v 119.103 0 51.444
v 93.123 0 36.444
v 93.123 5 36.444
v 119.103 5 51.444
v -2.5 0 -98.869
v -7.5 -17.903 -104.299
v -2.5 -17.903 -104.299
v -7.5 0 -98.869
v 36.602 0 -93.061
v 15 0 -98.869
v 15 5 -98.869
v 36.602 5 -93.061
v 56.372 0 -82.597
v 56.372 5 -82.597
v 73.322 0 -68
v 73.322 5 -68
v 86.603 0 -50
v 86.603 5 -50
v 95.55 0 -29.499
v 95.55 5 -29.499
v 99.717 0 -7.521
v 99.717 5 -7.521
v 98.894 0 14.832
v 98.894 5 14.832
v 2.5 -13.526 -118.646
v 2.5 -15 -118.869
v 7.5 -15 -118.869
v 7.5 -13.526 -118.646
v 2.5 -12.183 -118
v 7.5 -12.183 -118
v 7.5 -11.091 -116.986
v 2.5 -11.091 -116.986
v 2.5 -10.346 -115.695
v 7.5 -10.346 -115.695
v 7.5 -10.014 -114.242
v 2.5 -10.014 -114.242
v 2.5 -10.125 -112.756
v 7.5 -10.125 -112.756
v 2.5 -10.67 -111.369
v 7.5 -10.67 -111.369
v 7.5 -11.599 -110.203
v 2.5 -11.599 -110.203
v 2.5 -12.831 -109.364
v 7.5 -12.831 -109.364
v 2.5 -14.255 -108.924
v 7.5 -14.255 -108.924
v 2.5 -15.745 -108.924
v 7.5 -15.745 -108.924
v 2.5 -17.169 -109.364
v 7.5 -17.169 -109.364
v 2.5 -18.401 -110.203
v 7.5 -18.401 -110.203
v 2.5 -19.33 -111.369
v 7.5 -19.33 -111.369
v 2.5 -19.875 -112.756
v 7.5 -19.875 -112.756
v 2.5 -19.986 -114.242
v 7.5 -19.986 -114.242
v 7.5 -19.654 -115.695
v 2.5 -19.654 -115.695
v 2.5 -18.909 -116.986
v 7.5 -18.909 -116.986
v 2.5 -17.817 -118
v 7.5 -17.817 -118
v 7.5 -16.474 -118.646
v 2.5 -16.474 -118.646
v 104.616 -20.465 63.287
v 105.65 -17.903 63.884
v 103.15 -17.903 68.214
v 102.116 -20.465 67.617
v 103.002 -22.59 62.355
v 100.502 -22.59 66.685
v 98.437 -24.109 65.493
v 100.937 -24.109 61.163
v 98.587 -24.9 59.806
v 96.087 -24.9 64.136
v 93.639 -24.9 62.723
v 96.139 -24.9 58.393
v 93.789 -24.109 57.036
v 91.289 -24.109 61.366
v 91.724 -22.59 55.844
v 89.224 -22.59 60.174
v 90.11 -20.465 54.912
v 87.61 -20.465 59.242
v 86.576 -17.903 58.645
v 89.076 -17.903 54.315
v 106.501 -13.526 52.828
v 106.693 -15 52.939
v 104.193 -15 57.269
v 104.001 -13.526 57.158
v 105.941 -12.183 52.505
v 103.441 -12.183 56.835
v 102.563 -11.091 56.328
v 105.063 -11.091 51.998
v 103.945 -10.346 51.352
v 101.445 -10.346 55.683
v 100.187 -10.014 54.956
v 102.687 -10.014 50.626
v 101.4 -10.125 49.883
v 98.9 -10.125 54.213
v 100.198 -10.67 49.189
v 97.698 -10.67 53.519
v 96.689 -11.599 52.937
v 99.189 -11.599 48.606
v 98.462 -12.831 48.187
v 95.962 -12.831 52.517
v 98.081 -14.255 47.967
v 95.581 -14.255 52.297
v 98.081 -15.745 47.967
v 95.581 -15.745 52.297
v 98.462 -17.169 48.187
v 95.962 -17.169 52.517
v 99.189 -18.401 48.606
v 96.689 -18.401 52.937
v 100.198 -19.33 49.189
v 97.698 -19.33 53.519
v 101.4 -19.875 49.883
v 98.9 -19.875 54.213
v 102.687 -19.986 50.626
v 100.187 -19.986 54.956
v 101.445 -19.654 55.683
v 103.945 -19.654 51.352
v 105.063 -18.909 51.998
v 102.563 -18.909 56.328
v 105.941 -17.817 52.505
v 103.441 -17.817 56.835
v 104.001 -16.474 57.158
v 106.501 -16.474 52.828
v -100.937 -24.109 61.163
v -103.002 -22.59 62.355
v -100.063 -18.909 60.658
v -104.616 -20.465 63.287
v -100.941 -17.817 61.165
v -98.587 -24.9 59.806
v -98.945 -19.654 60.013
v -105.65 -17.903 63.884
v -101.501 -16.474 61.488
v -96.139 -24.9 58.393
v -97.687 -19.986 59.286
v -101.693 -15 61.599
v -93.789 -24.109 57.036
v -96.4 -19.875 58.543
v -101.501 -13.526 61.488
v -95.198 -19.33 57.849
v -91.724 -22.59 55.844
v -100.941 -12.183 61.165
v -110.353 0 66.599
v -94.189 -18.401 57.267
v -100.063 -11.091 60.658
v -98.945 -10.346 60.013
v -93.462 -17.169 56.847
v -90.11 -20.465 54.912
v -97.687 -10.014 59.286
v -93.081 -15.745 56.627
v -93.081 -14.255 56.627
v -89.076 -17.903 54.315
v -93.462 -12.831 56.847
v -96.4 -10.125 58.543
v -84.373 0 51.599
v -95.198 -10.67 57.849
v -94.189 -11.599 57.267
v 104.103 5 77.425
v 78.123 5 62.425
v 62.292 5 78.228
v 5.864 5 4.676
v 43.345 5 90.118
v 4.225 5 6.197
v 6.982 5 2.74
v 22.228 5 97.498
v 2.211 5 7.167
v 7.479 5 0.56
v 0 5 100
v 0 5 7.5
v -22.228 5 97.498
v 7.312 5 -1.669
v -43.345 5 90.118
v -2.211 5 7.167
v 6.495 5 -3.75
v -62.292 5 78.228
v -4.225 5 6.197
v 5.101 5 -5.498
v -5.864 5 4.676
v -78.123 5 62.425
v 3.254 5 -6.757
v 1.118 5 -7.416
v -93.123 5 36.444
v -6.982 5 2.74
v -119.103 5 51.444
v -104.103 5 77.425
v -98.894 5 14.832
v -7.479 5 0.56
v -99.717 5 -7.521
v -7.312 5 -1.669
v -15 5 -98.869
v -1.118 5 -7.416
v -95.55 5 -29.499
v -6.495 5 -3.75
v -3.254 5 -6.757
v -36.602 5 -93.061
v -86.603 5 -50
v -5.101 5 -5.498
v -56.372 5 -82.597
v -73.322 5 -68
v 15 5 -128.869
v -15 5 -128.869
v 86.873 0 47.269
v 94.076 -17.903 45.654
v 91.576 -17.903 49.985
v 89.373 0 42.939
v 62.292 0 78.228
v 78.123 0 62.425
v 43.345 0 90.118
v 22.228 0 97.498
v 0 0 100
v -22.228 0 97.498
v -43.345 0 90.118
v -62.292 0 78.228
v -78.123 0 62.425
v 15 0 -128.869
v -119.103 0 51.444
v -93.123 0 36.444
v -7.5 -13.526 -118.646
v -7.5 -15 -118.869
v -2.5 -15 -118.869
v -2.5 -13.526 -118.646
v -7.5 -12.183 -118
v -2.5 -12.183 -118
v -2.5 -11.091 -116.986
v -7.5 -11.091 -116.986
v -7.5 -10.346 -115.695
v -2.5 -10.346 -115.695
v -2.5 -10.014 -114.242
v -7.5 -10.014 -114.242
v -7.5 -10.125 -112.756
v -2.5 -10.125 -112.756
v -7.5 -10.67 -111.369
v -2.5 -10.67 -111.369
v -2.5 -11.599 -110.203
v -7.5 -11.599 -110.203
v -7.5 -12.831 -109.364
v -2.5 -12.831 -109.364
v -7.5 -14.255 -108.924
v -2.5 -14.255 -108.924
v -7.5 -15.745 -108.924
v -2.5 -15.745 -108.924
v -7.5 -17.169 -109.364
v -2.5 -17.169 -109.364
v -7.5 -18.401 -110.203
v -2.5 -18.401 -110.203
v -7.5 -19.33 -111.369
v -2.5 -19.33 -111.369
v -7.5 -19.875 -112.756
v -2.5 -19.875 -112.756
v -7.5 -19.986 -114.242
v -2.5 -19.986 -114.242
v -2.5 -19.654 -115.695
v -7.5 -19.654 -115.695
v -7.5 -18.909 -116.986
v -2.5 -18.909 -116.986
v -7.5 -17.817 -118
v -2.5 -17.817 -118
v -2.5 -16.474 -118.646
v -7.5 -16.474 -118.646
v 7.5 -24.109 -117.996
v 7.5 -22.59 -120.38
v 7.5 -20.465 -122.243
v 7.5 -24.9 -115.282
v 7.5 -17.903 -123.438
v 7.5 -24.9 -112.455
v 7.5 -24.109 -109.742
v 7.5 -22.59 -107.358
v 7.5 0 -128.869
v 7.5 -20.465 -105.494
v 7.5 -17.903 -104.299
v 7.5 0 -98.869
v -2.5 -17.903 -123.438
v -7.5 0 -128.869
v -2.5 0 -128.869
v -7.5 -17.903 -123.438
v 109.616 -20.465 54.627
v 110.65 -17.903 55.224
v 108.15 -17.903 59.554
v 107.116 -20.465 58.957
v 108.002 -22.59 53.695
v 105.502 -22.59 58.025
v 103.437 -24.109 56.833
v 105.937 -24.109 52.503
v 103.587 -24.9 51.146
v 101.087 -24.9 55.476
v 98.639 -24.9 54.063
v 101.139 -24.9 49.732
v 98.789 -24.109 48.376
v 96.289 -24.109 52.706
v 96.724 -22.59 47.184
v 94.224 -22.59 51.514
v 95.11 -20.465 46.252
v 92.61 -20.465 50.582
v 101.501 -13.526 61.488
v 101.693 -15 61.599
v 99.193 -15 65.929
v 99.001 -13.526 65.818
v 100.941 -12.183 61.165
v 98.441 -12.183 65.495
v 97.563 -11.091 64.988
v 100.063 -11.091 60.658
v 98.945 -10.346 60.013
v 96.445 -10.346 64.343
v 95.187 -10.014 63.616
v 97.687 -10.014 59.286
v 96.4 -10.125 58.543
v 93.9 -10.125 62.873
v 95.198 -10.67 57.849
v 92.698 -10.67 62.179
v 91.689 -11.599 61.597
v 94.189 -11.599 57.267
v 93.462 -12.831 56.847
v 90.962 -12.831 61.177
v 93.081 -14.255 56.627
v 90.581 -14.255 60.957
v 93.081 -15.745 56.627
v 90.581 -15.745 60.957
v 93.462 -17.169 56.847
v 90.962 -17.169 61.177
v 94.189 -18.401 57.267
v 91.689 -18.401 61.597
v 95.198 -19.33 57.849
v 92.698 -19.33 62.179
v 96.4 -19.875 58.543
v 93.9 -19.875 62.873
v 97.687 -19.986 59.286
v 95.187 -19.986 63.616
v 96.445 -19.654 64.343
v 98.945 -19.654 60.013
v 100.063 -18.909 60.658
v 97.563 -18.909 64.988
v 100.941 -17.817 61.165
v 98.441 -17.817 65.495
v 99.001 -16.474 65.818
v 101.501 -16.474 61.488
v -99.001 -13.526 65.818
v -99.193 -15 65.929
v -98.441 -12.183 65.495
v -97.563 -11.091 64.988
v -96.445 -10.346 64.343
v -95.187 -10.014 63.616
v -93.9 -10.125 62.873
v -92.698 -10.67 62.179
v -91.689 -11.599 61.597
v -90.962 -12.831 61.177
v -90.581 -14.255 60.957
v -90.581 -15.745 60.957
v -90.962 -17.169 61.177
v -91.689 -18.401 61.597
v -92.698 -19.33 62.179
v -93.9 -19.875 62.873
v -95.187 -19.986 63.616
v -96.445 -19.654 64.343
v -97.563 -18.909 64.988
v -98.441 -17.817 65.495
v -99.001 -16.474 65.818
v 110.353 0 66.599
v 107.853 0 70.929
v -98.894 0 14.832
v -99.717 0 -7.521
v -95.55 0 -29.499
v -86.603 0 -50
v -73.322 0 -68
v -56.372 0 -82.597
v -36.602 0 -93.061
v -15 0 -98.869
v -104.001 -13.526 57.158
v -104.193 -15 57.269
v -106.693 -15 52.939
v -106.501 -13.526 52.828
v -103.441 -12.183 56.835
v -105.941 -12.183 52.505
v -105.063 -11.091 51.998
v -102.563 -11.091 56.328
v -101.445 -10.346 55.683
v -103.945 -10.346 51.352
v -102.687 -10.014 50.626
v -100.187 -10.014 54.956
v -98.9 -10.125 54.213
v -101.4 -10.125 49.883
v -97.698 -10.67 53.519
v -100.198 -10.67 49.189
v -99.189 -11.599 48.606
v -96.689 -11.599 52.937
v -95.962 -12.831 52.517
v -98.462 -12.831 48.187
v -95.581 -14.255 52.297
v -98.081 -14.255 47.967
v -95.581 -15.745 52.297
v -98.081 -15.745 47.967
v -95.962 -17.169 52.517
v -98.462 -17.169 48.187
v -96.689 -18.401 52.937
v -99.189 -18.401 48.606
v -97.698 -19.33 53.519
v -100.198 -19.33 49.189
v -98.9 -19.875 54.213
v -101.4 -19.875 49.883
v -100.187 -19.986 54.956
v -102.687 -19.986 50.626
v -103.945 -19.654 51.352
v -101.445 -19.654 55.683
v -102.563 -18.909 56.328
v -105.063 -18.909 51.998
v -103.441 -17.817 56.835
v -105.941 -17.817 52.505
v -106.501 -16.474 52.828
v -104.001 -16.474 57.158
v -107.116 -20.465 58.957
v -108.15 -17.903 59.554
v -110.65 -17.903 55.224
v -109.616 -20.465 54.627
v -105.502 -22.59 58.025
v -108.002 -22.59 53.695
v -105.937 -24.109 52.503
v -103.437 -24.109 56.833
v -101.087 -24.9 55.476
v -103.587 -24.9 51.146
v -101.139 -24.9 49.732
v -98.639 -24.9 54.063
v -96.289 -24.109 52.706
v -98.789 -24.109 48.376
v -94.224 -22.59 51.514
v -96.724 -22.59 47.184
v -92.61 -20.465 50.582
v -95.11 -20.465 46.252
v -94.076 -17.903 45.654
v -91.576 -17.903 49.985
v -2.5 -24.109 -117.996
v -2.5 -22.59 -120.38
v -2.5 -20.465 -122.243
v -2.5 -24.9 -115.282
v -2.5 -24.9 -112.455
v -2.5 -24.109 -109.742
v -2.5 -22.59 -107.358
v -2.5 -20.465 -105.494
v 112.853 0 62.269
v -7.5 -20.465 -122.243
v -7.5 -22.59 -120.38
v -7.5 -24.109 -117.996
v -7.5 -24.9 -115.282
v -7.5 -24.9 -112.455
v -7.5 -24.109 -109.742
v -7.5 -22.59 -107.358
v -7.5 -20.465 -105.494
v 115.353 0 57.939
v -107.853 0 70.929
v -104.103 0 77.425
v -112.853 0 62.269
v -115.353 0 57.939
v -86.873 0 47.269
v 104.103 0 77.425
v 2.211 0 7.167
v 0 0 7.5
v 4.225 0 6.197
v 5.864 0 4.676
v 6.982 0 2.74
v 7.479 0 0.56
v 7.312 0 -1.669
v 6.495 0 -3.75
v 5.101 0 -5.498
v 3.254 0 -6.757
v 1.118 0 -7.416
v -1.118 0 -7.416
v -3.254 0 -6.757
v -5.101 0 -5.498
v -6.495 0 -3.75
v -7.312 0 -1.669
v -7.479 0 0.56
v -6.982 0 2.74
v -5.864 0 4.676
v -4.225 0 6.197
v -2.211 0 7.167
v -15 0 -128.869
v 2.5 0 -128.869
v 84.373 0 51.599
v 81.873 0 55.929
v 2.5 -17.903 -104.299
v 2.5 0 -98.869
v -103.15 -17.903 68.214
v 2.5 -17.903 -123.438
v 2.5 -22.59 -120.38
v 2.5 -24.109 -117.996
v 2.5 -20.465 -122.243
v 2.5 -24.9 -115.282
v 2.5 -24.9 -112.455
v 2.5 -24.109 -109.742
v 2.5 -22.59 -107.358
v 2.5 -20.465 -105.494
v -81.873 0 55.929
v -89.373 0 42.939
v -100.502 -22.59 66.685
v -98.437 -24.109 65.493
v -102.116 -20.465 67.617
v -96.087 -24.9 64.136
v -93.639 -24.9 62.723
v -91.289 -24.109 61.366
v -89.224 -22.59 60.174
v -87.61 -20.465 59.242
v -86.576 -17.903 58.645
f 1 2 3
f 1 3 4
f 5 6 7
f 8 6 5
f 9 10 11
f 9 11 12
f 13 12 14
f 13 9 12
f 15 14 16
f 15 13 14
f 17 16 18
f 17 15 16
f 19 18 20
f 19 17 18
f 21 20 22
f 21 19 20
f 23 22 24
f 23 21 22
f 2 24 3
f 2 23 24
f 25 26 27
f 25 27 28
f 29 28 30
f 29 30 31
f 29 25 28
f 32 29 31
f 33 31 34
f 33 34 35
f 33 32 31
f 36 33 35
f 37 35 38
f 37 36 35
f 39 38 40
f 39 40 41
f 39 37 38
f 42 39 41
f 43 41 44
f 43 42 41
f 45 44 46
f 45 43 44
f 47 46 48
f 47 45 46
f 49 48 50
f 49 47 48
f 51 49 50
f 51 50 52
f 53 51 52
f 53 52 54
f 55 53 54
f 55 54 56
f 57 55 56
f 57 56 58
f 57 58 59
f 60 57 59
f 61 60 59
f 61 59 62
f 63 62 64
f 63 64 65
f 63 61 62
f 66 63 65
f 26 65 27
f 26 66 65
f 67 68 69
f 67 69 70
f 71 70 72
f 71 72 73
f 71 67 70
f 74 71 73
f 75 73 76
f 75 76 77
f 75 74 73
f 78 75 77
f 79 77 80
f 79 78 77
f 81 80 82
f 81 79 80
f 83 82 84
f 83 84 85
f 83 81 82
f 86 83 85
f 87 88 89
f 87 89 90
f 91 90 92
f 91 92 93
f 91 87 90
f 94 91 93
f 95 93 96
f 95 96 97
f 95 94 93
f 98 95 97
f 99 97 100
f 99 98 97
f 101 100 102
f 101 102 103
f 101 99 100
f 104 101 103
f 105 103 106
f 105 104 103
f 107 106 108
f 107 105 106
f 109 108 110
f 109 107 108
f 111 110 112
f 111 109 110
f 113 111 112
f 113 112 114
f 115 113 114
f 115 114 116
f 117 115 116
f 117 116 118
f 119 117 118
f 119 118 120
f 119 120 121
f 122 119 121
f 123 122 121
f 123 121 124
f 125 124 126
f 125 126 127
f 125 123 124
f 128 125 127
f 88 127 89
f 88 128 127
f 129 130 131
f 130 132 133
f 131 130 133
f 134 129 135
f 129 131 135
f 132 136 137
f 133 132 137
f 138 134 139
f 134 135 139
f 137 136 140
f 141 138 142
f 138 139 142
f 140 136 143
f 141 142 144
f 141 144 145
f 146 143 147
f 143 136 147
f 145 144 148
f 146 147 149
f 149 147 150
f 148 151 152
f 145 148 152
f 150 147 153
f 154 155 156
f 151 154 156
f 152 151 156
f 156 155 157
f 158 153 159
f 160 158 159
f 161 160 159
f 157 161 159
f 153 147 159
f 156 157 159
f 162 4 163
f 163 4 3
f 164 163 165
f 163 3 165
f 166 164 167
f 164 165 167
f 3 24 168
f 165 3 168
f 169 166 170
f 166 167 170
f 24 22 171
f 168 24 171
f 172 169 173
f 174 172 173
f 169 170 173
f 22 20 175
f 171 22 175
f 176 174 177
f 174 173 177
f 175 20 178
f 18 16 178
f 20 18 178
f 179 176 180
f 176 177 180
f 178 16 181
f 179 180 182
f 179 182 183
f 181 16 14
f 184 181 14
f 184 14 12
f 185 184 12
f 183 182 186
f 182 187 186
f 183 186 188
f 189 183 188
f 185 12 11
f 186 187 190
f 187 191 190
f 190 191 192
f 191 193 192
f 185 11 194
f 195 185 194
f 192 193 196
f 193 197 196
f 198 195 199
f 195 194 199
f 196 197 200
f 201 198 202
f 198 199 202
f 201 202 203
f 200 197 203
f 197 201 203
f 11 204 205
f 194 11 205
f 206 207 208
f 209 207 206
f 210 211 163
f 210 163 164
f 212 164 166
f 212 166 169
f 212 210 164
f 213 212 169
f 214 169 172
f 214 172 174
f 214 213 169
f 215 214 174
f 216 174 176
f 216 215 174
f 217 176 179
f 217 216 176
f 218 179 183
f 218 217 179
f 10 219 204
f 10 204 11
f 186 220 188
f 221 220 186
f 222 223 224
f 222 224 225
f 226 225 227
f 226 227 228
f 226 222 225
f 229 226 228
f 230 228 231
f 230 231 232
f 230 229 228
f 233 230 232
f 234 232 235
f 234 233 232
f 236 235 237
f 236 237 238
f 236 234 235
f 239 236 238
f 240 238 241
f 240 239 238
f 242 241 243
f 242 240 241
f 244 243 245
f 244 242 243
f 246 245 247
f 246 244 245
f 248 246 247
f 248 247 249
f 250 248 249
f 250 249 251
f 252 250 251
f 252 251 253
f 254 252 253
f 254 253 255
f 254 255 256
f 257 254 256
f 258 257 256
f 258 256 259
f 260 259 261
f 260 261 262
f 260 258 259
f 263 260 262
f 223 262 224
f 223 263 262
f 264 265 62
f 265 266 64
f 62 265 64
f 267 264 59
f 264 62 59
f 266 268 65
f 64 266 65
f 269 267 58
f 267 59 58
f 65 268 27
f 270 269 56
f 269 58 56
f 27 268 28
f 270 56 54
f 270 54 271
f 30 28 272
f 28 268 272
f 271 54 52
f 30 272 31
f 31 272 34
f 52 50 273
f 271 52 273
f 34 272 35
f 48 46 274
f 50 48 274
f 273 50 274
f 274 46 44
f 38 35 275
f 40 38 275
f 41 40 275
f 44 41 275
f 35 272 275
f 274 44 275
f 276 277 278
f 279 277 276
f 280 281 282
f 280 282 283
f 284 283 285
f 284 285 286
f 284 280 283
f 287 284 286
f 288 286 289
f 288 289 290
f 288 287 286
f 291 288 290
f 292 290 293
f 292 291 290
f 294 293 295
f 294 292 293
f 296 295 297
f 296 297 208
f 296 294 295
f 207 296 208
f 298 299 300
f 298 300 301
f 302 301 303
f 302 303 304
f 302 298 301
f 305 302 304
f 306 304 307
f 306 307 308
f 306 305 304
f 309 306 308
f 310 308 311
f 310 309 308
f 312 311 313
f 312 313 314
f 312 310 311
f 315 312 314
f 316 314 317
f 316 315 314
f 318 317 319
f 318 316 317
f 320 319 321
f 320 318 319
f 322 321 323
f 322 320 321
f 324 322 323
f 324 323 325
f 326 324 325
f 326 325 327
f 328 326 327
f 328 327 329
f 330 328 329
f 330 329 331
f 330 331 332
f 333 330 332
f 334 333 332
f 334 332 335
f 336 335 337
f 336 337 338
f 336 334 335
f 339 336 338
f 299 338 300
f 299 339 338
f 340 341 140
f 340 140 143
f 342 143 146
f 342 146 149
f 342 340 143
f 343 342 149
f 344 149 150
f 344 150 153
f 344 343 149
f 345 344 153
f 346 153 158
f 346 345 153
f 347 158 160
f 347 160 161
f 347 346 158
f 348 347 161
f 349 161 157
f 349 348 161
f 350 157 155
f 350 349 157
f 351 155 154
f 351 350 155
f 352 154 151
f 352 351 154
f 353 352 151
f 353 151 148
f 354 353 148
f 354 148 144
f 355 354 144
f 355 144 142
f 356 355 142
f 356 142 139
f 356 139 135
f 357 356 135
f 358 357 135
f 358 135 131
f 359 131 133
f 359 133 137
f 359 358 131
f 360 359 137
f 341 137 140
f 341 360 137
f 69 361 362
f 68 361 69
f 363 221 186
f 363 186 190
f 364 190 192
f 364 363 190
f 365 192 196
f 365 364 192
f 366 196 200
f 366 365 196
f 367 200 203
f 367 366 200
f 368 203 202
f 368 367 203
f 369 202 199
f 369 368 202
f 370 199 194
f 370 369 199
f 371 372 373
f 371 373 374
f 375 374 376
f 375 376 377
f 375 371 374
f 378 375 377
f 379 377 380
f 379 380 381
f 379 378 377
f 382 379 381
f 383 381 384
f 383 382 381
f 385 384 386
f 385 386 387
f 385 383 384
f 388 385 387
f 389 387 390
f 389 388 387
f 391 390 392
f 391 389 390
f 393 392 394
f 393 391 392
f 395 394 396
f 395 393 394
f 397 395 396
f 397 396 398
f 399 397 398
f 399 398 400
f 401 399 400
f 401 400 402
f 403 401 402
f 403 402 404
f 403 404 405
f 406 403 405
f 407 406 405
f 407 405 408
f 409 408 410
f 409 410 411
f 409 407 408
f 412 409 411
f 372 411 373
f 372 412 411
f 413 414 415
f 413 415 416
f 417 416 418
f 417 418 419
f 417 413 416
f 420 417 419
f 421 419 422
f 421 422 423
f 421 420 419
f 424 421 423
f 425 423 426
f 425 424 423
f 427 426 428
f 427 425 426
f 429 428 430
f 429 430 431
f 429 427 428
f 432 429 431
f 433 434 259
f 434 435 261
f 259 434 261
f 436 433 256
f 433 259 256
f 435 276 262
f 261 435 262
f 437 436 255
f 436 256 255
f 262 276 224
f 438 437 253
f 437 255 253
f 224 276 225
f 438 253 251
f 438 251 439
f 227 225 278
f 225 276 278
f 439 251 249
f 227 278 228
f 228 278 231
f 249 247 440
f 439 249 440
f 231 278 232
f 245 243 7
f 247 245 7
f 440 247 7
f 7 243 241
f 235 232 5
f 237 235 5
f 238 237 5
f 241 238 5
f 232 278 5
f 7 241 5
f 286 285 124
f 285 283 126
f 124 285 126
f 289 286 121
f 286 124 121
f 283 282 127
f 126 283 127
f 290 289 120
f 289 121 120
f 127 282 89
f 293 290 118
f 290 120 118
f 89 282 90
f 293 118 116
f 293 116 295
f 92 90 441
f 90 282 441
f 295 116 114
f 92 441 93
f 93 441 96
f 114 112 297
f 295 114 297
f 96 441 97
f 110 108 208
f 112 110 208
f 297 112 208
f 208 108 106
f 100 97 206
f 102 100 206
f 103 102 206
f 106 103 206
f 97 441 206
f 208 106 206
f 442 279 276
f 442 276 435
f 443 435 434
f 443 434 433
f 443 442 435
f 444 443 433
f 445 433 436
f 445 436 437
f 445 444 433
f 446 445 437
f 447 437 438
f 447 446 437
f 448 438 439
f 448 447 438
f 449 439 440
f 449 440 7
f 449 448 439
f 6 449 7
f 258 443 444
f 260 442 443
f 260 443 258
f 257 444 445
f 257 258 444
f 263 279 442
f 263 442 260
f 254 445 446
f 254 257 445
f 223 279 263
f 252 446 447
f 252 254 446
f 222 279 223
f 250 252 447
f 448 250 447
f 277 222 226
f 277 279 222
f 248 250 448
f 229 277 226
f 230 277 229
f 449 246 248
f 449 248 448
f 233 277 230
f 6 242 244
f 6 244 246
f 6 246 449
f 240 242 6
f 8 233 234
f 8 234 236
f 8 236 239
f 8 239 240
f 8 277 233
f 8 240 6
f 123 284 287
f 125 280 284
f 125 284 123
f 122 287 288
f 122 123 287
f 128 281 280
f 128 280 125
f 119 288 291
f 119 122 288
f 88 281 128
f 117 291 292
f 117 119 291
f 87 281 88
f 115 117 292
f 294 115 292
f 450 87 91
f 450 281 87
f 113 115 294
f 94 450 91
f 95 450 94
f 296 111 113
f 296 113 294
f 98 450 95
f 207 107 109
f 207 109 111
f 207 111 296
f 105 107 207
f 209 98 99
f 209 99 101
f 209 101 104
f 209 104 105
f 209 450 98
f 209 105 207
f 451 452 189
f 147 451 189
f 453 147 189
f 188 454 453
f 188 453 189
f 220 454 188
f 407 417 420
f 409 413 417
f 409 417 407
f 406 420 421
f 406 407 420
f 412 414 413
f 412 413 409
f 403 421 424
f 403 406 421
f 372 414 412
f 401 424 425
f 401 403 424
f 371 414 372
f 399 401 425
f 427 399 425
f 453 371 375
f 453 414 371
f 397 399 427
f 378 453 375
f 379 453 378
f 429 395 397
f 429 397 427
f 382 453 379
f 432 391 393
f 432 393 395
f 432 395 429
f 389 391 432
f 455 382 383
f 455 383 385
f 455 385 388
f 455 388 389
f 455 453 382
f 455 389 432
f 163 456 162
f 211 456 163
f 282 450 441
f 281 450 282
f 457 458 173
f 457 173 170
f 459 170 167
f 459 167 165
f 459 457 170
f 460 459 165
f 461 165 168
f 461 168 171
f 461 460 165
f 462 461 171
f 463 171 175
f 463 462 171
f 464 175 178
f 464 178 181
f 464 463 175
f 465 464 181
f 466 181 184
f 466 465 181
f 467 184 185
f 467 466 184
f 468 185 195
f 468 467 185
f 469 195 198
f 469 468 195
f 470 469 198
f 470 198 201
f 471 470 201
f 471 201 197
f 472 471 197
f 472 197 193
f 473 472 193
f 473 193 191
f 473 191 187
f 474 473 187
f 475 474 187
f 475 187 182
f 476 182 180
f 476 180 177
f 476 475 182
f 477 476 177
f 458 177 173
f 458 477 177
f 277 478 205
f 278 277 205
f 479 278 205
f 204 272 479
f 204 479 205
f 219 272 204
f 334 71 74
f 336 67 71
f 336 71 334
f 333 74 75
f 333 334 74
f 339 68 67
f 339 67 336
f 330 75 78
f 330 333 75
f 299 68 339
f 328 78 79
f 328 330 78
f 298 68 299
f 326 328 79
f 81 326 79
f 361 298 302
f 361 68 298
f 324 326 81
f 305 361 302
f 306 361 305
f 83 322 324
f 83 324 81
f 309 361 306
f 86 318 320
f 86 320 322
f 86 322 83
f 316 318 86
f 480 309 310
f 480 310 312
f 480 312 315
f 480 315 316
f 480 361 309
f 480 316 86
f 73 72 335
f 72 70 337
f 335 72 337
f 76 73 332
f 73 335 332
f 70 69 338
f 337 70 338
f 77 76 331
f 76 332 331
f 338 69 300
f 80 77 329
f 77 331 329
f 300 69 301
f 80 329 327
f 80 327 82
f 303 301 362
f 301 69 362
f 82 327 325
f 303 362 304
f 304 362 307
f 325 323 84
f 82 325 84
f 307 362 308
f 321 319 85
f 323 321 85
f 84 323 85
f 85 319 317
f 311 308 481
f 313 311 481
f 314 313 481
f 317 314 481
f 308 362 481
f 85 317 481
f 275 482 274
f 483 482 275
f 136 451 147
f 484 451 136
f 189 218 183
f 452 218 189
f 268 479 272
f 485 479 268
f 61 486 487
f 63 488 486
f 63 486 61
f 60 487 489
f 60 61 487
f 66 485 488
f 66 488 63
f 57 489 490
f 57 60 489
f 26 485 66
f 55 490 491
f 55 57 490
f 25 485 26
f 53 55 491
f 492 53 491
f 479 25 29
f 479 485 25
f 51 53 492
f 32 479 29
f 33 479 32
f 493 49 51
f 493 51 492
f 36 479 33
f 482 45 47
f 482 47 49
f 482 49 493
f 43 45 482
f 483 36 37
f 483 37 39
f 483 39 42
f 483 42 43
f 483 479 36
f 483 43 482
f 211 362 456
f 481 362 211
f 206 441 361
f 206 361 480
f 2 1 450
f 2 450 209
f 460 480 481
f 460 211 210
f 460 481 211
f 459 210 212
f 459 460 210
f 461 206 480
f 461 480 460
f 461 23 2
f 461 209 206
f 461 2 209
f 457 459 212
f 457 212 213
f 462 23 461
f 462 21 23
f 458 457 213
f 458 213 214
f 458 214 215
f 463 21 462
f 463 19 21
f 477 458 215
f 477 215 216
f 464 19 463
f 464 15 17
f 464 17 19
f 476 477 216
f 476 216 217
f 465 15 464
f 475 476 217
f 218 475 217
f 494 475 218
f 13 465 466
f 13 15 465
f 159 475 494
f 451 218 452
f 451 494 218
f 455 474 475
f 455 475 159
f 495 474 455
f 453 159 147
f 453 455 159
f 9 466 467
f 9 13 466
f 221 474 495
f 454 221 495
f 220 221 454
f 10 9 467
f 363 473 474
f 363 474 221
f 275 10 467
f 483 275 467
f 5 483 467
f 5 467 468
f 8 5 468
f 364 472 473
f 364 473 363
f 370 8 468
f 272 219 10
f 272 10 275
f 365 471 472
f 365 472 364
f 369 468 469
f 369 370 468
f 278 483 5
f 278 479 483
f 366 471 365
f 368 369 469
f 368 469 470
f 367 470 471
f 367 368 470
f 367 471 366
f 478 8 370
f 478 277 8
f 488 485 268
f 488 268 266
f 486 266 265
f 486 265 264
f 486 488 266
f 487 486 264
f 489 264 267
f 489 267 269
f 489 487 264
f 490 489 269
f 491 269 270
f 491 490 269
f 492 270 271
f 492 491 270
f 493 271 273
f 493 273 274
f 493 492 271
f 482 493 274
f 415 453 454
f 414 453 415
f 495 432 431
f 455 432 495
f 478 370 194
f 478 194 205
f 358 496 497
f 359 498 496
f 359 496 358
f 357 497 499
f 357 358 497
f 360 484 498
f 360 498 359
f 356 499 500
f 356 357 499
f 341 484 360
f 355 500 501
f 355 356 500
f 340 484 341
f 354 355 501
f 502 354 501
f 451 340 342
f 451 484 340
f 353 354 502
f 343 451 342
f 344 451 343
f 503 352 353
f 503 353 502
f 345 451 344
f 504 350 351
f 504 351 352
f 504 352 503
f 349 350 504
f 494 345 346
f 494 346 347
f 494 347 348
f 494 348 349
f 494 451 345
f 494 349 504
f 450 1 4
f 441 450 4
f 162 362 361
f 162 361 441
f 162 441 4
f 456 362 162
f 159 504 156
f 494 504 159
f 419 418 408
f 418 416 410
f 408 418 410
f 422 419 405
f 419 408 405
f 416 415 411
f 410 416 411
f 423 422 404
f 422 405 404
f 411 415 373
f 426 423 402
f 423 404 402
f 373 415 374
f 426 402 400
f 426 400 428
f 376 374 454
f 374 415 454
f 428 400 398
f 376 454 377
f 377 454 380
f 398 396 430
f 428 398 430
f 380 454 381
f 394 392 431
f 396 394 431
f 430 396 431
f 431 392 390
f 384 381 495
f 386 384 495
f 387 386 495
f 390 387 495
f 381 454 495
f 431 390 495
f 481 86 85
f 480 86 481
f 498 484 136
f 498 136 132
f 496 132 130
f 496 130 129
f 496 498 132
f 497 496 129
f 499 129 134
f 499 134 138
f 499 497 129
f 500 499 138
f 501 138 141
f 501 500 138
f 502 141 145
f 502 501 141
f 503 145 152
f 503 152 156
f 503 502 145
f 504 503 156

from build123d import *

# Parameters (mm, degrees)
SKETCH1_R           = 7.5
BOSS_EXTRUDE2_DEPTH = 5
BOSS_EXTRUDE5_START = 2.5
SKETCH4_R           = 5
BOSS_EXTRUDE5_DEPTH = 5
BOSS_EXTRUDE6_START = -7.5
SKETCH4_2_R         = 5
BOSS_EXTRUDE6_DEPTH = 5
CIRPATTERN5_COUNT   = 3
CIRPATTERN5_ANGLE   = 240


with BuildPart() as part:
    # Sketch1 → Boss-Extrude2 (new body)
    with BuildSketch(Plane(origin=(0, 0, 0), x_dir=(1, 0, 0), z_dir=(0, 1, 0))):
        with BuildLine():
            Line((-15, 128.868599666), (-15, 98.868599666))
            ThreePointArc((-15, 98.868599666), (-86.602540378, 50), (-93.122718948, -36.443918776))
            Line((-93.122718948, -36.443918776), (-119.103481061, -51.443918776))
            Line((-119.103481061, -51.443918776), (-104.103481061, -77.42468089))
            Line((-104.103481061, -77.42468089), (-78.122718948, -62.42468089))
            ThreePointArc((-78.122718948, -62.42468089), (0, -100), (78.122718948, -62.42468089))
            Line((78.122718948, -62.42468089), (104.103481061, -77.42468089))
            Line((104.103481061, -77.42468089), (119.103481061, -51.443918776))
            Line((119.103481061, -51.443918776), (93.122718948, -36.443918776))
            ThreePointArc((93.122718948, -36.443918776), (86.602540378, 50), (15, 98.868599666))
            Line((15, 98.868599666), (15, 128.868599666))
            Line((15, 128.868599666), (-15, 128.868599666))
        make_face()
        Circle(SKETCH1_R, mode=Mode.SUBTRACT)
    extrude(amount=BOSS_EXTRUDE2_DEPTH)

    # Sketch4 → Boss-Extrude5 (add)
    with BuildSketch(Plane(origin=(0, 0, 0), x_dir=(0, 0, -1), z_dir=(1, 0, 0)).offset(BOSS_EXTRUDE5_START)):
        with BuildLine():
            Line((104.299170688, -17.902762311), (98.868599666, 0))
            Line((98.868599666, 0), (128.868599666, 0))
            Line((128.868599666, 0), (123.438028644, -17.902762311))
            ThreePointArc((123.438028644, -17.902762311), (113.868599666, -25), (104.299170688, -17.902762311))
        make_face()
        with Locations((113.868599666, -15)):
            Circle(SKETCH4_R, mode=Mode.SUBTRACT)
    boss_extrude5 = extrude(amount=BOSS_EXTRUDE5_DEPTH)

    # Sketch4<2> → Boss-Extrude6 (add)
    with BuildSketch(Plane(origin=(0, 0, 0), x_dir=(0, 0, -1), z_dir=(1, 0, 0)).offset(BOSS_EXTRUDE6_START)):
        with BuildLine():
            Line((104.299170688, -17.902762311), (98.868599666, 0))
            Line((98.868599666, 0), (128.868599666, 0))
            Line((128.868599666, 0), (123.438028644, -17.902762311))
            ThreePointArc((123.438028644, -17.902762311), (113.868599666, -25), (104.299170688, -17.902762311))
        make_face()
        with Locations((113.868599666, -15)):
            Circle(SKETCH4_2_R, mode=Mode.SUBTRACT)
    boss_extrude6 = extrude(amount=BOSS_EXTRUDE6_DEPTH)

    # CirPattern5: Boss-Extrude5, Boss-Extrude6 ×3 about axis
    cirpattern5_axis = Axis((0, 0, 0), (0, 1, 0))
    add([boss_extrude5.rotate(cirpattern5_axis, i * CIRPATTERN5_ANGLE / (CIRPATTERN5_COUNT - 1)) for i in range(1, CIRPATTERN5_COUNT)])
    add([boss_extrude6.rotate(cirpattern5_axis, i * CIRPATTERN5_ANGLE / (CIRPATTERN5_COUNT - 1)) for i in range(1, CIRPATTERN5_COUNT)])


solid = part.part
